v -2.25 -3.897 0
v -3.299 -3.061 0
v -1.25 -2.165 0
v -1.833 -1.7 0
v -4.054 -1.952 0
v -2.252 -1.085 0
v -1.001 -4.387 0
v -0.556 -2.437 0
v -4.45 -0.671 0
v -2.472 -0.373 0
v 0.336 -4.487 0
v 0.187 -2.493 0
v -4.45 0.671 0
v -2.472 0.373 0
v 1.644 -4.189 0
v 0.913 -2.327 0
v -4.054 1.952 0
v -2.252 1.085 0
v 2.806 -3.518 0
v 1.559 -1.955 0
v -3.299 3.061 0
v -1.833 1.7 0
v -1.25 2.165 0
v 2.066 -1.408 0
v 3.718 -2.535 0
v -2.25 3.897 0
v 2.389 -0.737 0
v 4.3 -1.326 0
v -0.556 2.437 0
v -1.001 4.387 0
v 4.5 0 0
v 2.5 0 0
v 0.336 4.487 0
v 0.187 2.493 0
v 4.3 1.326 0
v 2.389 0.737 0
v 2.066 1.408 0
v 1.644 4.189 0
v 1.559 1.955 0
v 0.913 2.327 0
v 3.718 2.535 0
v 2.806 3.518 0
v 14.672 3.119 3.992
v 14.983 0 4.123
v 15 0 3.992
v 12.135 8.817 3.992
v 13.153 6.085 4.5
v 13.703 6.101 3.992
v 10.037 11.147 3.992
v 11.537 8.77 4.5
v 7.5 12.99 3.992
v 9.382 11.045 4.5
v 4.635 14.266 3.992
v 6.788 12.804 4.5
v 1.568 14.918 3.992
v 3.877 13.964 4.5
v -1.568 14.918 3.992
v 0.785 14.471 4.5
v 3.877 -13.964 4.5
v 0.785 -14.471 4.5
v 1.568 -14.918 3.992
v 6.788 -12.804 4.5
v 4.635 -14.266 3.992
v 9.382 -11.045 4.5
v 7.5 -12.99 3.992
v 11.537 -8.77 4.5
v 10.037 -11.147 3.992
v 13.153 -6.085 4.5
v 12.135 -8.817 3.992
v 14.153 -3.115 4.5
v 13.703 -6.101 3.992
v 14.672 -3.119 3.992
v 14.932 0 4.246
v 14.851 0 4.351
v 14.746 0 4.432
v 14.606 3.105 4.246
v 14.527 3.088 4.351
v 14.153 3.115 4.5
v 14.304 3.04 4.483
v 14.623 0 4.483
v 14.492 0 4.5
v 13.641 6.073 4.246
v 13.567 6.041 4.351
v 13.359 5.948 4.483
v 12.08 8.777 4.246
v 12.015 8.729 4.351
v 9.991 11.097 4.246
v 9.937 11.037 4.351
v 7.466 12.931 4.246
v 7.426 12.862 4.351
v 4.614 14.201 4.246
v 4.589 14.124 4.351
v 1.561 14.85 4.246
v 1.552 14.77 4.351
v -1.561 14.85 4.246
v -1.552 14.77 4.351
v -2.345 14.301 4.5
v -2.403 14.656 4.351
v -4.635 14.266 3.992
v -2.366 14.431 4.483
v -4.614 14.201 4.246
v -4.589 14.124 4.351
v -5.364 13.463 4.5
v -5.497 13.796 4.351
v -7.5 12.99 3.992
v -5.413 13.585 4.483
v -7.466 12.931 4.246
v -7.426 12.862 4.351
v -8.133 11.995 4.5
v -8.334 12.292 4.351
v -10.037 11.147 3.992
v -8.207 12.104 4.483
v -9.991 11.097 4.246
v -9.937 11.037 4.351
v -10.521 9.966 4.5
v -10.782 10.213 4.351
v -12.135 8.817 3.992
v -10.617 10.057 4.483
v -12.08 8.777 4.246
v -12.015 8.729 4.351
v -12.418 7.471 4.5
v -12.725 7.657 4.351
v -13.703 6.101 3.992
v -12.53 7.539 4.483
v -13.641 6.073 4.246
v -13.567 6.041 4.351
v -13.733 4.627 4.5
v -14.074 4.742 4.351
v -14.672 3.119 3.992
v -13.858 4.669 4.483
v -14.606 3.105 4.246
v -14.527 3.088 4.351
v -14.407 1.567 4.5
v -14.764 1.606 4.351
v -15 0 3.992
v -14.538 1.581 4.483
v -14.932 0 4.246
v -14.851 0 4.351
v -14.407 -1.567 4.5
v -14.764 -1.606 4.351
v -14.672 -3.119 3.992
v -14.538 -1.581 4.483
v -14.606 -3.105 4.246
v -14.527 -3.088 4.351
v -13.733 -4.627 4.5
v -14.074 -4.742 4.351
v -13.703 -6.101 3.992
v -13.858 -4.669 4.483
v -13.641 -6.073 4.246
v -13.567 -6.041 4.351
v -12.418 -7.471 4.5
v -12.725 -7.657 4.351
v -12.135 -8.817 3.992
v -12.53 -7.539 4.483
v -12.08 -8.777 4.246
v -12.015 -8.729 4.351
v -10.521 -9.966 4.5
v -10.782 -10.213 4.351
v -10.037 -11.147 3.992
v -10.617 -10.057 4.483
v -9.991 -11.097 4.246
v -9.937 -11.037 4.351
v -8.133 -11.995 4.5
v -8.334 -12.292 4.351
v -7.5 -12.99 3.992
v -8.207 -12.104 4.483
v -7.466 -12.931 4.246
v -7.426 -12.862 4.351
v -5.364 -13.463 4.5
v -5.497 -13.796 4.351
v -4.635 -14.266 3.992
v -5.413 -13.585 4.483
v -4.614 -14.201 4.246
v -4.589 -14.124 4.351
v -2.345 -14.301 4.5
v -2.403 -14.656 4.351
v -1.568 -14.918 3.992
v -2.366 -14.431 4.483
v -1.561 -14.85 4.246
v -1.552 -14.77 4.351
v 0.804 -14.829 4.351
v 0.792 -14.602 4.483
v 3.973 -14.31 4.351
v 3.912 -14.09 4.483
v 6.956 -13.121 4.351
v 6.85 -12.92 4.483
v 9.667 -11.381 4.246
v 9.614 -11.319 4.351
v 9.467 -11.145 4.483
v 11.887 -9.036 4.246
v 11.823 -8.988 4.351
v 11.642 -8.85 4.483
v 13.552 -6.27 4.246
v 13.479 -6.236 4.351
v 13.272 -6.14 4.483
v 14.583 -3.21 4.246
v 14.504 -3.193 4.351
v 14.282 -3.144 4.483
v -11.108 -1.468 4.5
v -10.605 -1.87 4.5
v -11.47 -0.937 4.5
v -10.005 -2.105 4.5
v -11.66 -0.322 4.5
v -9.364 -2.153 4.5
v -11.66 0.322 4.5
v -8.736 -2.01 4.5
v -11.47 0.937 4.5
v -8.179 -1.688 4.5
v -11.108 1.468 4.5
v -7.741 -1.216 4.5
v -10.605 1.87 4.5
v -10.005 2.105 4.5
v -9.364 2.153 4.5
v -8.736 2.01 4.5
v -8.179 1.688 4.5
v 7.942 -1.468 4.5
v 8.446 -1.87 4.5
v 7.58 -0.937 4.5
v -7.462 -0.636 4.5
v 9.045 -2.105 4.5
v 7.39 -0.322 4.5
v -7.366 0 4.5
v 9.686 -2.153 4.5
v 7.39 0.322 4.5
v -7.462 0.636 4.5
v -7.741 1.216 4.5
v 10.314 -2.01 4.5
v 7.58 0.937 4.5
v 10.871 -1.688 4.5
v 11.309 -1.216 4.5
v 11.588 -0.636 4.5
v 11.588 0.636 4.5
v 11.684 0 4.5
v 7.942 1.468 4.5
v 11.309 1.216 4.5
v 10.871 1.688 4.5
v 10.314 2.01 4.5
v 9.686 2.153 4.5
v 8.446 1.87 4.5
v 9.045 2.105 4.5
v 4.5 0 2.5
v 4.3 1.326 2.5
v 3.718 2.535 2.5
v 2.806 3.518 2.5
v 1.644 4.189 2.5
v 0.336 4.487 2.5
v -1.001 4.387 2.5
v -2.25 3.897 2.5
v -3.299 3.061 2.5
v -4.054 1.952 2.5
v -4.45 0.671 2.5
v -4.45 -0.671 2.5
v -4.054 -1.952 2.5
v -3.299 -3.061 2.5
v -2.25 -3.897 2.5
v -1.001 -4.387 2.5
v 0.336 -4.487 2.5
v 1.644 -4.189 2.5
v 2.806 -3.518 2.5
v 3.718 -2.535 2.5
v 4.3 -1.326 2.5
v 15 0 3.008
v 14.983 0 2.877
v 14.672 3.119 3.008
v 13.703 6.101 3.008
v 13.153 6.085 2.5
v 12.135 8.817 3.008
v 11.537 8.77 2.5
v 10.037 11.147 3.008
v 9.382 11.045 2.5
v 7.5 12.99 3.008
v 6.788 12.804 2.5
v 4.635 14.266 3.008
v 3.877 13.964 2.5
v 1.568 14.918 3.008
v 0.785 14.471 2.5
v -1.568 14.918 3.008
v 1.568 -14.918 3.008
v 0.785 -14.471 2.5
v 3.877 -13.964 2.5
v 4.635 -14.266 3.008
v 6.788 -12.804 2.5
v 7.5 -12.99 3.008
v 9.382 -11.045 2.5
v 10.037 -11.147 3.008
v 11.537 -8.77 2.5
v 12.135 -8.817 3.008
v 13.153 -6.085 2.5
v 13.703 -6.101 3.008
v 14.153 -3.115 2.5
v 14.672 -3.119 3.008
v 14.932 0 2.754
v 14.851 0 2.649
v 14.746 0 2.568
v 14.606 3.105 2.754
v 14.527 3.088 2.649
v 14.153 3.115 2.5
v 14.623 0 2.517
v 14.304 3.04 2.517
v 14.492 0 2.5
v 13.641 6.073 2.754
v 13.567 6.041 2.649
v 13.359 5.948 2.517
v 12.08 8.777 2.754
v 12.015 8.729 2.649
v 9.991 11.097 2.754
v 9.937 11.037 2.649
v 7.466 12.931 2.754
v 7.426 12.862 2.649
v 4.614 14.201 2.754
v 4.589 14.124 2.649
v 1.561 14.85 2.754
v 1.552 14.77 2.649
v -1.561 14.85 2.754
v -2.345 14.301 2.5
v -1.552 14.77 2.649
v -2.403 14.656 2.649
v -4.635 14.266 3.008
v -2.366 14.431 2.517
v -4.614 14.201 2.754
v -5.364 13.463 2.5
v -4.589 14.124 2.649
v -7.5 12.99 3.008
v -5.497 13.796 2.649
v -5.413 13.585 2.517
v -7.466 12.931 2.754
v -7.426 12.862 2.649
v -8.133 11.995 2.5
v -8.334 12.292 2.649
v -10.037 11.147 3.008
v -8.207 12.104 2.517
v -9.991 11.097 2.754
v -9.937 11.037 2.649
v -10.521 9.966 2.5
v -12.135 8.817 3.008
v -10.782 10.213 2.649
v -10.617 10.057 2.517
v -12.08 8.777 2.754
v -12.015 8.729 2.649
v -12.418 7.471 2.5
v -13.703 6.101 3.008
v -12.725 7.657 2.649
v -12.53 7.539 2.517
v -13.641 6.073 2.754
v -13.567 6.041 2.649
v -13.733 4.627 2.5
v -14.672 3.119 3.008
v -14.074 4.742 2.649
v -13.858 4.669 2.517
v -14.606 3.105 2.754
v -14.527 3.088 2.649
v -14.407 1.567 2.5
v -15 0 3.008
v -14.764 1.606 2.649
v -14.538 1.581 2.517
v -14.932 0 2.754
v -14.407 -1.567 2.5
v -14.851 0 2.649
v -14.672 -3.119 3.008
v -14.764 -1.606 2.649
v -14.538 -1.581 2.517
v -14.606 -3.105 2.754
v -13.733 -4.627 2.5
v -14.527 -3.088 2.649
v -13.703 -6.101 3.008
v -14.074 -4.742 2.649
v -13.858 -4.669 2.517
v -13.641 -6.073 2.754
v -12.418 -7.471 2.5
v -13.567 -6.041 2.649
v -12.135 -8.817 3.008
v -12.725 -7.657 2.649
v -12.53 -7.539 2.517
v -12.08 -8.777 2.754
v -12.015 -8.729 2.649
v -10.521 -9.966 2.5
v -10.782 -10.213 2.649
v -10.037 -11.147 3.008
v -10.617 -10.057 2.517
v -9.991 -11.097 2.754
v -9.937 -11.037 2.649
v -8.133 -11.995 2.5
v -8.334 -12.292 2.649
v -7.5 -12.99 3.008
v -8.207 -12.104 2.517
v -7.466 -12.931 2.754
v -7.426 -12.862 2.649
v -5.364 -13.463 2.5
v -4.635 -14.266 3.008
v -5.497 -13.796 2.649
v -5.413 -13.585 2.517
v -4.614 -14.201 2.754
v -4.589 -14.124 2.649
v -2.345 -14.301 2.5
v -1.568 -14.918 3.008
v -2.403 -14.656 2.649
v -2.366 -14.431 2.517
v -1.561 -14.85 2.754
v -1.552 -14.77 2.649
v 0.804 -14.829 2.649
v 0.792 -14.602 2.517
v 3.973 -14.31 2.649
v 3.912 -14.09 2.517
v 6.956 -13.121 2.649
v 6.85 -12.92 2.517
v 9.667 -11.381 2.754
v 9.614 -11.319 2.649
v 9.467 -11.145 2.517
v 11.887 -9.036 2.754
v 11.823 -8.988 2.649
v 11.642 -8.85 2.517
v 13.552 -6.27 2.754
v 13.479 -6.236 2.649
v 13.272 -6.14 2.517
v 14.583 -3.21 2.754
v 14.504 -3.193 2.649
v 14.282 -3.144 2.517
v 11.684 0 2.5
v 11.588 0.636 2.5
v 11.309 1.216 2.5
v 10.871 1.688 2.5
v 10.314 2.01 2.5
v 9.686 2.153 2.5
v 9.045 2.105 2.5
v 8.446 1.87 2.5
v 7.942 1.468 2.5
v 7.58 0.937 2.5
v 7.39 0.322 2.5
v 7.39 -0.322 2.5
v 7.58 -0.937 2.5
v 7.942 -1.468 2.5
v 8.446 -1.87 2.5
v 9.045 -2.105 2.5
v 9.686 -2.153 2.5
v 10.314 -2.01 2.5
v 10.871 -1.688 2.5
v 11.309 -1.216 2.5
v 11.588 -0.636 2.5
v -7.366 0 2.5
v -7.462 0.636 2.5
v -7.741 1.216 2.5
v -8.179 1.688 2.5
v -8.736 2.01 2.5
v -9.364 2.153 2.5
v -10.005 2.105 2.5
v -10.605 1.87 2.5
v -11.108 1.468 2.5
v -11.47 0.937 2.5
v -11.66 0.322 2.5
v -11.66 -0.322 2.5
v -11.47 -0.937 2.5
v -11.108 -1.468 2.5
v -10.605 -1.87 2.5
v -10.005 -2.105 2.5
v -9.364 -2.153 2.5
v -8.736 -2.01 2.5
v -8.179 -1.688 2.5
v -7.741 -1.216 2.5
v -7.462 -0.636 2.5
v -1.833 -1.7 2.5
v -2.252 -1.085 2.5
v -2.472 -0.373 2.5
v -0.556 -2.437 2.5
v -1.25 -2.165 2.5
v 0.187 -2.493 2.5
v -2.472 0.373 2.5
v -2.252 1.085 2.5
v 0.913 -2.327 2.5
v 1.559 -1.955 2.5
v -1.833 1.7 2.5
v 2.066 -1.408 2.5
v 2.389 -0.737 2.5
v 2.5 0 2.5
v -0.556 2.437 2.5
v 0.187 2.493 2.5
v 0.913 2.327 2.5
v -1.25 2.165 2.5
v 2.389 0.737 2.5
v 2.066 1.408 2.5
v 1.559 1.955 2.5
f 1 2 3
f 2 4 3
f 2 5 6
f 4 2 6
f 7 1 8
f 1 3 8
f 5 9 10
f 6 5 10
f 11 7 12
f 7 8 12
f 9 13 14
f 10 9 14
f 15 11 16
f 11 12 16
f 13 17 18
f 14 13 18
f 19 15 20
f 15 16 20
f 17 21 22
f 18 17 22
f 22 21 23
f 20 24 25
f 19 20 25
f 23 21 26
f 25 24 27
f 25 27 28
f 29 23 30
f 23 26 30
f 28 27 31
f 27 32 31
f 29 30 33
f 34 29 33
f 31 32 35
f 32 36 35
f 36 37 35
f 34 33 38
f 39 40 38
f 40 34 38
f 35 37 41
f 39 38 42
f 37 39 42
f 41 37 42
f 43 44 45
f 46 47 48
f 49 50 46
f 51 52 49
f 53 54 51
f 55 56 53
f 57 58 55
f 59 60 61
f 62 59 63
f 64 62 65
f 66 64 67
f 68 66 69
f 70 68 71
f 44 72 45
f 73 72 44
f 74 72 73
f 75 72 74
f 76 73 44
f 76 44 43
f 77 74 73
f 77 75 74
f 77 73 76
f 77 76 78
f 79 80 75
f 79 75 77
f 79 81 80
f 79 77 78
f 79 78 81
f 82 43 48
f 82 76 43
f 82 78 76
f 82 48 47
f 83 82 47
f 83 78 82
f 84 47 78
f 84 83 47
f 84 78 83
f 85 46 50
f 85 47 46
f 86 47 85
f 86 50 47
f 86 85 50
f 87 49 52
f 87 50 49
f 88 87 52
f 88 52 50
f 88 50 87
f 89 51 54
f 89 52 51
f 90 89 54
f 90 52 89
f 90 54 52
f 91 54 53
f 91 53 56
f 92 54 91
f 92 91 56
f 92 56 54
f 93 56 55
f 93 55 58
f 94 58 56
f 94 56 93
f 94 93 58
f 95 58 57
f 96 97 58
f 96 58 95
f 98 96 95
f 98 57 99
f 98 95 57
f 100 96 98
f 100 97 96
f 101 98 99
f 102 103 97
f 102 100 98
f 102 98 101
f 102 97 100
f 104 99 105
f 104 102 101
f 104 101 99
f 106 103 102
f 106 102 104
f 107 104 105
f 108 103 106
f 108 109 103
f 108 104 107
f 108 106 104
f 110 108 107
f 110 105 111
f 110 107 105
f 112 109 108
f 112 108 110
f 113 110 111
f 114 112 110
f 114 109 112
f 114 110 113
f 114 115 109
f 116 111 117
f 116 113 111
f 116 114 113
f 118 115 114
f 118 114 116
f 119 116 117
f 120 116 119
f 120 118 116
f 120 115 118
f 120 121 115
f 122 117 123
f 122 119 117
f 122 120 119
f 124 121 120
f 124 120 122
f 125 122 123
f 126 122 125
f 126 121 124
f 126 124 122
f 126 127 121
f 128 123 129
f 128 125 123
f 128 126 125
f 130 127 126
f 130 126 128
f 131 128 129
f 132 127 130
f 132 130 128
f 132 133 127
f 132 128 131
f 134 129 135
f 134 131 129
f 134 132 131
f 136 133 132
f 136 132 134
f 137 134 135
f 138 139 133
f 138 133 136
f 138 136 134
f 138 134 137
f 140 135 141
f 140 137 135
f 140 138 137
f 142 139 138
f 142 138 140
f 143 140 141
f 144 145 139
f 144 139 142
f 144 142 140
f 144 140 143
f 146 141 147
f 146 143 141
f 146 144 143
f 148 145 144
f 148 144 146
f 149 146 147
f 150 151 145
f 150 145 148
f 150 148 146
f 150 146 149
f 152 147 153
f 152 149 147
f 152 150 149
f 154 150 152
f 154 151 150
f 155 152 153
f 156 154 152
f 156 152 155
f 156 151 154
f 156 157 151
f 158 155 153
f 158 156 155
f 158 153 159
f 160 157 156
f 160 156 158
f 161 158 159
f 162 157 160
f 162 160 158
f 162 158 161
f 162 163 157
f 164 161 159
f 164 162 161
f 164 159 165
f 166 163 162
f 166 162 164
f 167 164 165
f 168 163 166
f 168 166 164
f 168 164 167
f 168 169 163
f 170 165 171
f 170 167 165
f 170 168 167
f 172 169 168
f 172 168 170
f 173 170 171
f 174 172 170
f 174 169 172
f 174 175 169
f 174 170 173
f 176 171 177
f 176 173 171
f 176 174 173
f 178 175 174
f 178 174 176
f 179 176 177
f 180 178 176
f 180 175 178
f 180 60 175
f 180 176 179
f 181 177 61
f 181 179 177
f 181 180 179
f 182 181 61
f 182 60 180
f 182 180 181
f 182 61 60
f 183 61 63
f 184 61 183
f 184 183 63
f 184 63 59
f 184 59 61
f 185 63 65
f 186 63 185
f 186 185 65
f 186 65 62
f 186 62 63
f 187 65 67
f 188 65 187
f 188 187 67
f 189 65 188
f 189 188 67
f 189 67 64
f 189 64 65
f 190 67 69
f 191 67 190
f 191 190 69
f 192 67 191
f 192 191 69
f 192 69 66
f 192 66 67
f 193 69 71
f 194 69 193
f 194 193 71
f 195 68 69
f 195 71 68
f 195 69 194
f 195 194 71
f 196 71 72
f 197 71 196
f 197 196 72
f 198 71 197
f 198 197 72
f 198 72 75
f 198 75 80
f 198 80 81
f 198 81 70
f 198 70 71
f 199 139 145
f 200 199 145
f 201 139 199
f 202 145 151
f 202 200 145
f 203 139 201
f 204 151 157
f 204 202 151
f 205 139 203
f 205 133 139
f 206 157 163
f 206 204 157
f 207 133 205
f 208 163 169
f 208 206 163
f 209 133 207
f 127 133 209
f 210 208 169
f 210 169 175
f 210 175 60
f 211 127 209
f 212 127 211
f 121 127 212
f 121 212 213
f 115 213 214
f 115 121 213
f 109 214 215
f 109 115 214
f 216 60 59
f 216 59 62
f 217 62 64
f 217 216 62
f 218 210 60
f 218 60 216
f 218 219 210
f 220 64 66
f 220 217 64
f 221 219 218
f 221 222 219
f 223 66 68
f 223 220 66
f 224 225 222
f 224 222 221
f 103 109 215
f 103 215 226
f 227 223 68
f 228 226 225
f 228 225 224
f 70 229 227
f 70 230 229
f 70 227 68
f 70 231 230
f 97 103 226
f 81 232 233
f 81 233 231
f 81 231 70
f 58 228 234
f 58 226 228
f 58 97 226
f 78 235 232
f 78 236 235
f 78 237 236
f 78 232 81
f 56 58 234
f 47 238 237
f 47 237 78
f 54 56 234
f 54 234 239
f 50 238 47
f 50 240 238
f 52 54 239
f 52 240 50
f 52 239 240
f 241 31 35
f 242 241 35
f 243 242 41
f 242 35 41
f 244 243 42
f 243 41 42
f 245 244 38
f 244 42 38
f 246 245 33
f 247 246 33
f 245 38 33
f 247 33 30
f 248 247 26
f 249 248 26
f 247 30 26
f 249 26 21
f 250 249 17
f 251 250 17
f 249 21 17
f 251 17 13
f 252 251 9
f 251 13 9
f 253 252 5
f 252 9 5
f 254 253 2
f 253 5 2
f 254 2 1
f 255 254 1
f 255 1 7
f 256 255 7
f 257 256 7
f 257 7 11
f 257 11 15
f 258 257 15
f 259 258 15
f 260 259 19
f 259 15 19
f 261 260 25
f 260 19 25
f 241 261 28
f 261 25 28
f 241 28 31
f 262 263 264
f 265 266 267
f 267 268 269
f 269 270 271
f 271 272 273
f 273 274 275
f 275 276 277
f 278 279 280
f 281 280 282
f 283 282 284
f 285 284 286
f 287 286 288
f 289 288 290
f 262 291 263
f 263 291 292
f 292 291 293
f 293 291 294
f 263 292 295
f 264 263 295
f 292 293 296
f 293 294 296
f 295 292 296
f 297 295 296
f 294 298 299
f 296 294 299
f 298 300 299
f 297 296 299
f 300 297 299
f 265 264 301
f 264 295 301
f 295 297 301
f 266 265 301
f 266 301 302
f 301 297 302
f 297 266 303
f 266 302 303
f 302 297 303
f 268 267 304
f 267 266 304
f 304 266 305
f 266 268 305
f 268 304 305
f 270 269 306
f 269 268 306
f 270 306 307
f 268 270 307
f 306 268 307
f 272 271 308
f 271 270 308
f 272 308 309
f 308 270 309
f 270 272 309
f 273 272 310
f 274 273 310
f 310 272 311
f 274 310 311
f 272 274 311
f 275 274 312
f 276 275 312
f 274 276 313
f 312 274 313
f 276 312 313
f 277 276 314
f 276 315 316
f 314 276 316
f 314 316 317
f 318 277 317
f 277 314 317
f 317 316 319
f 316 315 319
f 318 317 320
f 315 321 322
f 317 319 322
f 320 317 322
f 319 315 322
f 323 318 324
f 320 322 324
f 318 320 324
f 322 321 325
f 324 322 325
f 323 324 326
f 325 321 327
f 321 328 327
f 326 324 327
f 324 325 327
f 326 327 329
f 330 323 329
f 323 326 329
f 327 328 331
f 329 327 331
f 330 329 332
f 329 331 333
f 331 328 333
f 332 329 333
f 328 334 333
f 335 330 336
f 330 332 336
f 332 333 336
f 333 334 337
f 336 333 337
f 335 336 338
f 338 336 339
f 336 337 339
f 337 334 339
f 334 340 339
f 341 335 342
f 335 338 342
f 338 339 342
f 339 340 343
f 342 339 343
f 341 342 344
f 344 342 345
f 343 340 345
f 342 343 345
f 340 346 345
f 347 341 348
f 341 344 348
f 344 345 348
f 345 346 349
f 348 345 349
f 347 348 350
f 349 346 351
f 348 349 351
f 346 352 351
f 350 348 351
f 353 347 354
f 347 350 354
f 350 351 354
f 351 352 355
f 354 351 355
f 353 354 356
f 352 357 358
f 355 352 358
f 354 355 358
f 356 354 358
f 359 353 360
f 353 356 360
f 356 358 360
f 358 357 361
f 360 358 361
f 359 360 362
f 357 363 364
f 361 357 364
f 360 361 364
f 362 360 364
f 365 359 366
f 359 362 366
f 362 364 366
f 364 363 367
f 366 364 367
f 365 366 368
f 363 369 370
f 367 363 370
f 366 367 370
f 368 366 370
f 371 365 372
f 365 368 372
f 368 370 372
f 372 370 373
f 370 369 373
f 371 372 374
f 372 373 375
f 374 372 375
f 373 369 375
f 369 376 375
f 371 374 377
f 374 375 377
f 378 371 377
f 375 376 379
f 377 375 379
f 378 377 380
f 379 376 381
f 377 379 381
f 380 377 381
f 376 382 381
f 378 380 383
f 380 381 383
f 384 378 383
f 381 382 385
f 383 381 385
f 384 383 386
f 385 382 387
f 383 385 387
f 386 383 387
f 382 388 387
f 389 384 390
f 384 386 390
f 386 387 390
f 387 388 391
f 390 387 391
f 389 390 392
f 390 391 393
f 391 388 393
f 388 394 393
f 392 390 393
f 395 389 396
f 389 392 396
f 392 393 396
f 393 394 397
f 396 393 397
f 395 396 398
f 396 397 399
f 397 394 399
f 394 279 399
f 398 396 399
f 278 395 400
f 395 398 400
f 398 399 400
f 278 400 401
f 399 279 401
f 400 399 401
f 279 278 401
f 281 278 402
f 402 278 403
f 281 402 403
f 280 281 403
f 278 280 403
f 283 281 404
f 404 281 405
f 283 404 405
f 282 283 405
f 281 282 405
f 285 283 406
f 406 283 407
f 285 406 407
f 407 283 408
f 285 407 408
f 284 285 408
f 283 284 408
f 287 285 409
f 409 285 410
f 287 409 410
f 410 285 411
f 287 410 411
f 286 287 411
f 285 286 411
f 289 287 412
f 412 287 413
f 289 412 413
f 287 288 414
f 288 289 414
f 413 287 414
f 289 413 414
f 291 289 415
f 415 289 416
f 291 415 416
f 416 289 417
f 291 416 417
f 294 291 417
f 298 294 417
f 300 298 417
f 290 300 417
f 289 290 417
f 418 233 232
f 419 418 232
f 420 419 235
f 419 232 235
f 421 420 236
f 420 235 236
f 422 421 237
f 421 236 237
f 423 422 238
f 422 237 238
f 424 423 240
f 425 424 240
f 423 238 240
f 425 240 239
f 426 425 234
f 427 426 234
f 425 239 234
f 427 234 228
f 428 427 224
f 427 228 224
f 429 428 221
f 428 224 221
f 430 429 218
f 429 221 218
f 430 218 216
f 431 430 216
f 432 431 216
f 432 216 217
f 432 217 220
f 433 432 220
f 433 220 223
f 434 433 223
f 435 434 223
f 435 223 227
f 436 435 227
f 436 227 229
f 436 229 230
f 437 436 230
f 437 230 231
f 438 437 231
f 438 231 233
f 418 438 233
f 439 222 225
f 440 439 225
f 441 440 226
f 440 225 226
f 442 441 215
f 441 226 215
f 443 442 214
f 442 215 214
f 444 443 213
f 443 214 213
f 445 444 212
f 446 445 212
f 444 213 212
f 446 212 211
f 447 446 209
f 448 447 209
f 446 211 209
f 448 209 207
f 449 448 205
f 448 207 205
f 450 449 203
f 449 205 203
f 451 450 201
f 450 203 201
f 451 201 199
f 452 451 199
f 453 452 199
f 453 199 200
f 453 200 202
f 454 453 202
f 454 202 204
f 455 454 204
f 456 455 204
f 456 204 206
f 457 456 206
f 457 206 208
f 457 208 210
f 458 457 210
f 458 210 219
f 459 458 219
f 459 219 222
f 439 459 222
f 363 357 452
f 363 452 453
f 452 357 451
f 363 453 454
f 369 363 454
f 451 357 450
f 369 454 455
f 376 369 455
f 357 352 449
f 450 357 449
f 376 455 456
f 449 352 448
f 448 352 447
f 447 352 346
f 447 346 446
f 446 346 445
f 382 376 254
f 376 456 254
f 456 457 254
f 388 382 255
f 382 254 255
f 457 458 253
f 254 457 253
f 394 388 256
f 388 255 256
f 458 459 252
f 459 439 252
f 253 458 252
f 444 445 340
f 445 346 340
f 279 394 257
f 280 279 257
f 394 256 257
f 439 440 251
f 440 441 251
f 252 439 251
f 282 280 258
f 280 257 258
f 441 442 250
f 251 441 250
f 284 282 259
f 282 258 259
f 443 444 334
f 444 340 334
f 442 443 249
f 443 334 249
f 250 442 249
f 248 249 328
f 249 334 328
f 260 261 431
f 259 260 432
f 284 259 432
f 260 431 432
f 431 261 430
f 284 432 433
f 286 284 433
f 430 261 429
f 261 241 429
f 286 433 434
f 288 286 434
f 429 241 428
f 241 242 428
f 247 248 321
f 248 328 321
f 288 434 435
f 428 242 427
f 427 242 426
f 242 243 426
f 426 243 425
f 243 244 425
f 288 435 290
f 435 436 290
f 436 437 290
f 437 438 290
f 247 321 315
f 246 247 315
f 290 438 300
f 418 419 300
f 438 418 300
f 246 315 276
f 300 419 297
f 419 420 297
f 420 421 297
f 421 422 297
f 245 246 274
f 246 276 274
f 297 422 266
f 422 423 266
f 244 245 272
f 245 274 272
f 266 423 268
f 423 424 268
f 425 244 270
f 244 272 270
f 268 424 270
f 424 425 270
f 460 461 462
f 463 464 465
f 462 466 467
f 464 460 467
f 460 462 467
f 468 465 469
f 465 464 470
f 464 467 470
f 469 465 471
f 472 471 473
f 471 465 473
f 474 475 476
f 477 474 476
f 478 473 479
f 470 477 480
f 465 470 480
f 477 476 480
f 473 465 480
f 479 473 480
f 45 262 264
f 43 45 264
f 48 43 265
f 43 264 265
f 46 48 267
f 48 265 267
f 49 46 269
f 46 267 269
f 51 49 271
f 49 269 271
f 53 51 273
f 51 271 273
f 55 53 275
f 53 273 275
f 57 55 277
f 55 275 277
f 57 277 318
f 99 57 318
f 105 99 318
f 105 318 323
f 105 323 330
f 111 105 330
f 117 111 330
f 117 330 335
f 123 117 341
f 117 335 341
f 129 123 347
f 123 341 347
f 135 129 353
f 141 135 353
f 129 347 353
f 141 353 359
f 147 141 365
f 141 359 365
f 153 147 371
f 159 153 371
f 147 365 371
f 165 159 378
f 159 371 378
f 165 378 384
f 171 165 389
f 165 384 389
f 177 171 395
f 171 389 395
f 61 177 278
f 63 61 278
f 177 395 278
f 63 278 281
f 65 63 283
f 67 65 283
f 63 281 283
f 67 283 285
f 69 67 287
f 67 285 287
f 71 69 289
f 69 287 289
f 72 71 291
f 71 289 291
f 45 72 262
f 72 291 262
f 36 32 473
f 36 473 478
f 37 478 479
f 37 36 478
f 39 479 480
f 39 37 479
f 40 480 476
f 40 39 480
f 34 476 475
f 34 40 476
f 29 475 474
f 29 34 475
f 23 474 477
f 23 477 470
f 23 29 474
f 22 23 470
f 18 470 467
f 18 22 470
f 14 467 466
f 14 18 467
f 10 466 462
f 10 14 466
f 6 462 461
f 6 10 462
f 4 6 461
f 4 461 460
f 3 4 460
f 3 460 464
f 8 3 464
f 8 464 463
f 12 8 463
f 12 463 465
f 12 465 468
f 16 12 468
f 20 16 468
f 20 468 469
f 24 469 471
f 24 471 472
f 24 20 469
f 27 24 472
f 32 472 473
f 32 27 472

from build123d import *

# Parameters (mm, degrees)
SKETCH1_R               = 4.5
SKETCH1_R_2             = 2.5
BOSS_EXTRUDE1_DEPTH     = 2.5
SKETCH2_R               = 15
BOSS_EXTRUDE2_DEPTH     = 2
SKETCH3_R               = 2.159
CUT_EXTRUDE1_DEPTH      = 1
CUT_EXTRUDE1_DEPTH_BACK = 5.5
FILLET2_R               = 0.508


with BuildPart() as part:
    # Sketch1 → Boss-Extrude1 (new body)
    with BuildSketch(Plane.XY):
        Circle(SKETCH1_R)
        Circle(SKETCH1_R_2, mode=Mode.SUBTRACT)
    extrude(amount=BOSS_EXTRUDE1_DEPTH)

    # Sketch2 → Boss-Extrude2 (add)
    with BuildSketch(Plane.XY.offset(2.5)):
        Circle(SKETCH2_R)
    extrude(amount=BOSS_EXTRUDE2_DEPTH)

    # Sketch3 → Cut-Extrude1 (cut, two sides)
    with BuildSketch(Plane.XY.offset(4.5)) as cut_extrude1_sk:
        with Locations((-9.525, 0)):
            Circle(SKETCH3_R)
        with Locations((9.525, 0)):
            Circle(SKETCH3_R)
    extrude(amount=CUT_EXTRUDE1_DEPTH, mode=Mode.SUBTRACT)
    extrude(cut_extrude1_sk.sketch, amount=-CUT_EXTRUDE1_DEPTH_BACK, mode=Mode.SUBTRACT)

    # Fillet2
    fillet2_edges = [part.edges().sort_by_distance(p)[0] for p in [
        (-15, 0, 4.5),
        (-15, 0, 2.5),
    ]]
    fillet(fillet2_edges, radius=FILLET2_R)


solid = part.part
